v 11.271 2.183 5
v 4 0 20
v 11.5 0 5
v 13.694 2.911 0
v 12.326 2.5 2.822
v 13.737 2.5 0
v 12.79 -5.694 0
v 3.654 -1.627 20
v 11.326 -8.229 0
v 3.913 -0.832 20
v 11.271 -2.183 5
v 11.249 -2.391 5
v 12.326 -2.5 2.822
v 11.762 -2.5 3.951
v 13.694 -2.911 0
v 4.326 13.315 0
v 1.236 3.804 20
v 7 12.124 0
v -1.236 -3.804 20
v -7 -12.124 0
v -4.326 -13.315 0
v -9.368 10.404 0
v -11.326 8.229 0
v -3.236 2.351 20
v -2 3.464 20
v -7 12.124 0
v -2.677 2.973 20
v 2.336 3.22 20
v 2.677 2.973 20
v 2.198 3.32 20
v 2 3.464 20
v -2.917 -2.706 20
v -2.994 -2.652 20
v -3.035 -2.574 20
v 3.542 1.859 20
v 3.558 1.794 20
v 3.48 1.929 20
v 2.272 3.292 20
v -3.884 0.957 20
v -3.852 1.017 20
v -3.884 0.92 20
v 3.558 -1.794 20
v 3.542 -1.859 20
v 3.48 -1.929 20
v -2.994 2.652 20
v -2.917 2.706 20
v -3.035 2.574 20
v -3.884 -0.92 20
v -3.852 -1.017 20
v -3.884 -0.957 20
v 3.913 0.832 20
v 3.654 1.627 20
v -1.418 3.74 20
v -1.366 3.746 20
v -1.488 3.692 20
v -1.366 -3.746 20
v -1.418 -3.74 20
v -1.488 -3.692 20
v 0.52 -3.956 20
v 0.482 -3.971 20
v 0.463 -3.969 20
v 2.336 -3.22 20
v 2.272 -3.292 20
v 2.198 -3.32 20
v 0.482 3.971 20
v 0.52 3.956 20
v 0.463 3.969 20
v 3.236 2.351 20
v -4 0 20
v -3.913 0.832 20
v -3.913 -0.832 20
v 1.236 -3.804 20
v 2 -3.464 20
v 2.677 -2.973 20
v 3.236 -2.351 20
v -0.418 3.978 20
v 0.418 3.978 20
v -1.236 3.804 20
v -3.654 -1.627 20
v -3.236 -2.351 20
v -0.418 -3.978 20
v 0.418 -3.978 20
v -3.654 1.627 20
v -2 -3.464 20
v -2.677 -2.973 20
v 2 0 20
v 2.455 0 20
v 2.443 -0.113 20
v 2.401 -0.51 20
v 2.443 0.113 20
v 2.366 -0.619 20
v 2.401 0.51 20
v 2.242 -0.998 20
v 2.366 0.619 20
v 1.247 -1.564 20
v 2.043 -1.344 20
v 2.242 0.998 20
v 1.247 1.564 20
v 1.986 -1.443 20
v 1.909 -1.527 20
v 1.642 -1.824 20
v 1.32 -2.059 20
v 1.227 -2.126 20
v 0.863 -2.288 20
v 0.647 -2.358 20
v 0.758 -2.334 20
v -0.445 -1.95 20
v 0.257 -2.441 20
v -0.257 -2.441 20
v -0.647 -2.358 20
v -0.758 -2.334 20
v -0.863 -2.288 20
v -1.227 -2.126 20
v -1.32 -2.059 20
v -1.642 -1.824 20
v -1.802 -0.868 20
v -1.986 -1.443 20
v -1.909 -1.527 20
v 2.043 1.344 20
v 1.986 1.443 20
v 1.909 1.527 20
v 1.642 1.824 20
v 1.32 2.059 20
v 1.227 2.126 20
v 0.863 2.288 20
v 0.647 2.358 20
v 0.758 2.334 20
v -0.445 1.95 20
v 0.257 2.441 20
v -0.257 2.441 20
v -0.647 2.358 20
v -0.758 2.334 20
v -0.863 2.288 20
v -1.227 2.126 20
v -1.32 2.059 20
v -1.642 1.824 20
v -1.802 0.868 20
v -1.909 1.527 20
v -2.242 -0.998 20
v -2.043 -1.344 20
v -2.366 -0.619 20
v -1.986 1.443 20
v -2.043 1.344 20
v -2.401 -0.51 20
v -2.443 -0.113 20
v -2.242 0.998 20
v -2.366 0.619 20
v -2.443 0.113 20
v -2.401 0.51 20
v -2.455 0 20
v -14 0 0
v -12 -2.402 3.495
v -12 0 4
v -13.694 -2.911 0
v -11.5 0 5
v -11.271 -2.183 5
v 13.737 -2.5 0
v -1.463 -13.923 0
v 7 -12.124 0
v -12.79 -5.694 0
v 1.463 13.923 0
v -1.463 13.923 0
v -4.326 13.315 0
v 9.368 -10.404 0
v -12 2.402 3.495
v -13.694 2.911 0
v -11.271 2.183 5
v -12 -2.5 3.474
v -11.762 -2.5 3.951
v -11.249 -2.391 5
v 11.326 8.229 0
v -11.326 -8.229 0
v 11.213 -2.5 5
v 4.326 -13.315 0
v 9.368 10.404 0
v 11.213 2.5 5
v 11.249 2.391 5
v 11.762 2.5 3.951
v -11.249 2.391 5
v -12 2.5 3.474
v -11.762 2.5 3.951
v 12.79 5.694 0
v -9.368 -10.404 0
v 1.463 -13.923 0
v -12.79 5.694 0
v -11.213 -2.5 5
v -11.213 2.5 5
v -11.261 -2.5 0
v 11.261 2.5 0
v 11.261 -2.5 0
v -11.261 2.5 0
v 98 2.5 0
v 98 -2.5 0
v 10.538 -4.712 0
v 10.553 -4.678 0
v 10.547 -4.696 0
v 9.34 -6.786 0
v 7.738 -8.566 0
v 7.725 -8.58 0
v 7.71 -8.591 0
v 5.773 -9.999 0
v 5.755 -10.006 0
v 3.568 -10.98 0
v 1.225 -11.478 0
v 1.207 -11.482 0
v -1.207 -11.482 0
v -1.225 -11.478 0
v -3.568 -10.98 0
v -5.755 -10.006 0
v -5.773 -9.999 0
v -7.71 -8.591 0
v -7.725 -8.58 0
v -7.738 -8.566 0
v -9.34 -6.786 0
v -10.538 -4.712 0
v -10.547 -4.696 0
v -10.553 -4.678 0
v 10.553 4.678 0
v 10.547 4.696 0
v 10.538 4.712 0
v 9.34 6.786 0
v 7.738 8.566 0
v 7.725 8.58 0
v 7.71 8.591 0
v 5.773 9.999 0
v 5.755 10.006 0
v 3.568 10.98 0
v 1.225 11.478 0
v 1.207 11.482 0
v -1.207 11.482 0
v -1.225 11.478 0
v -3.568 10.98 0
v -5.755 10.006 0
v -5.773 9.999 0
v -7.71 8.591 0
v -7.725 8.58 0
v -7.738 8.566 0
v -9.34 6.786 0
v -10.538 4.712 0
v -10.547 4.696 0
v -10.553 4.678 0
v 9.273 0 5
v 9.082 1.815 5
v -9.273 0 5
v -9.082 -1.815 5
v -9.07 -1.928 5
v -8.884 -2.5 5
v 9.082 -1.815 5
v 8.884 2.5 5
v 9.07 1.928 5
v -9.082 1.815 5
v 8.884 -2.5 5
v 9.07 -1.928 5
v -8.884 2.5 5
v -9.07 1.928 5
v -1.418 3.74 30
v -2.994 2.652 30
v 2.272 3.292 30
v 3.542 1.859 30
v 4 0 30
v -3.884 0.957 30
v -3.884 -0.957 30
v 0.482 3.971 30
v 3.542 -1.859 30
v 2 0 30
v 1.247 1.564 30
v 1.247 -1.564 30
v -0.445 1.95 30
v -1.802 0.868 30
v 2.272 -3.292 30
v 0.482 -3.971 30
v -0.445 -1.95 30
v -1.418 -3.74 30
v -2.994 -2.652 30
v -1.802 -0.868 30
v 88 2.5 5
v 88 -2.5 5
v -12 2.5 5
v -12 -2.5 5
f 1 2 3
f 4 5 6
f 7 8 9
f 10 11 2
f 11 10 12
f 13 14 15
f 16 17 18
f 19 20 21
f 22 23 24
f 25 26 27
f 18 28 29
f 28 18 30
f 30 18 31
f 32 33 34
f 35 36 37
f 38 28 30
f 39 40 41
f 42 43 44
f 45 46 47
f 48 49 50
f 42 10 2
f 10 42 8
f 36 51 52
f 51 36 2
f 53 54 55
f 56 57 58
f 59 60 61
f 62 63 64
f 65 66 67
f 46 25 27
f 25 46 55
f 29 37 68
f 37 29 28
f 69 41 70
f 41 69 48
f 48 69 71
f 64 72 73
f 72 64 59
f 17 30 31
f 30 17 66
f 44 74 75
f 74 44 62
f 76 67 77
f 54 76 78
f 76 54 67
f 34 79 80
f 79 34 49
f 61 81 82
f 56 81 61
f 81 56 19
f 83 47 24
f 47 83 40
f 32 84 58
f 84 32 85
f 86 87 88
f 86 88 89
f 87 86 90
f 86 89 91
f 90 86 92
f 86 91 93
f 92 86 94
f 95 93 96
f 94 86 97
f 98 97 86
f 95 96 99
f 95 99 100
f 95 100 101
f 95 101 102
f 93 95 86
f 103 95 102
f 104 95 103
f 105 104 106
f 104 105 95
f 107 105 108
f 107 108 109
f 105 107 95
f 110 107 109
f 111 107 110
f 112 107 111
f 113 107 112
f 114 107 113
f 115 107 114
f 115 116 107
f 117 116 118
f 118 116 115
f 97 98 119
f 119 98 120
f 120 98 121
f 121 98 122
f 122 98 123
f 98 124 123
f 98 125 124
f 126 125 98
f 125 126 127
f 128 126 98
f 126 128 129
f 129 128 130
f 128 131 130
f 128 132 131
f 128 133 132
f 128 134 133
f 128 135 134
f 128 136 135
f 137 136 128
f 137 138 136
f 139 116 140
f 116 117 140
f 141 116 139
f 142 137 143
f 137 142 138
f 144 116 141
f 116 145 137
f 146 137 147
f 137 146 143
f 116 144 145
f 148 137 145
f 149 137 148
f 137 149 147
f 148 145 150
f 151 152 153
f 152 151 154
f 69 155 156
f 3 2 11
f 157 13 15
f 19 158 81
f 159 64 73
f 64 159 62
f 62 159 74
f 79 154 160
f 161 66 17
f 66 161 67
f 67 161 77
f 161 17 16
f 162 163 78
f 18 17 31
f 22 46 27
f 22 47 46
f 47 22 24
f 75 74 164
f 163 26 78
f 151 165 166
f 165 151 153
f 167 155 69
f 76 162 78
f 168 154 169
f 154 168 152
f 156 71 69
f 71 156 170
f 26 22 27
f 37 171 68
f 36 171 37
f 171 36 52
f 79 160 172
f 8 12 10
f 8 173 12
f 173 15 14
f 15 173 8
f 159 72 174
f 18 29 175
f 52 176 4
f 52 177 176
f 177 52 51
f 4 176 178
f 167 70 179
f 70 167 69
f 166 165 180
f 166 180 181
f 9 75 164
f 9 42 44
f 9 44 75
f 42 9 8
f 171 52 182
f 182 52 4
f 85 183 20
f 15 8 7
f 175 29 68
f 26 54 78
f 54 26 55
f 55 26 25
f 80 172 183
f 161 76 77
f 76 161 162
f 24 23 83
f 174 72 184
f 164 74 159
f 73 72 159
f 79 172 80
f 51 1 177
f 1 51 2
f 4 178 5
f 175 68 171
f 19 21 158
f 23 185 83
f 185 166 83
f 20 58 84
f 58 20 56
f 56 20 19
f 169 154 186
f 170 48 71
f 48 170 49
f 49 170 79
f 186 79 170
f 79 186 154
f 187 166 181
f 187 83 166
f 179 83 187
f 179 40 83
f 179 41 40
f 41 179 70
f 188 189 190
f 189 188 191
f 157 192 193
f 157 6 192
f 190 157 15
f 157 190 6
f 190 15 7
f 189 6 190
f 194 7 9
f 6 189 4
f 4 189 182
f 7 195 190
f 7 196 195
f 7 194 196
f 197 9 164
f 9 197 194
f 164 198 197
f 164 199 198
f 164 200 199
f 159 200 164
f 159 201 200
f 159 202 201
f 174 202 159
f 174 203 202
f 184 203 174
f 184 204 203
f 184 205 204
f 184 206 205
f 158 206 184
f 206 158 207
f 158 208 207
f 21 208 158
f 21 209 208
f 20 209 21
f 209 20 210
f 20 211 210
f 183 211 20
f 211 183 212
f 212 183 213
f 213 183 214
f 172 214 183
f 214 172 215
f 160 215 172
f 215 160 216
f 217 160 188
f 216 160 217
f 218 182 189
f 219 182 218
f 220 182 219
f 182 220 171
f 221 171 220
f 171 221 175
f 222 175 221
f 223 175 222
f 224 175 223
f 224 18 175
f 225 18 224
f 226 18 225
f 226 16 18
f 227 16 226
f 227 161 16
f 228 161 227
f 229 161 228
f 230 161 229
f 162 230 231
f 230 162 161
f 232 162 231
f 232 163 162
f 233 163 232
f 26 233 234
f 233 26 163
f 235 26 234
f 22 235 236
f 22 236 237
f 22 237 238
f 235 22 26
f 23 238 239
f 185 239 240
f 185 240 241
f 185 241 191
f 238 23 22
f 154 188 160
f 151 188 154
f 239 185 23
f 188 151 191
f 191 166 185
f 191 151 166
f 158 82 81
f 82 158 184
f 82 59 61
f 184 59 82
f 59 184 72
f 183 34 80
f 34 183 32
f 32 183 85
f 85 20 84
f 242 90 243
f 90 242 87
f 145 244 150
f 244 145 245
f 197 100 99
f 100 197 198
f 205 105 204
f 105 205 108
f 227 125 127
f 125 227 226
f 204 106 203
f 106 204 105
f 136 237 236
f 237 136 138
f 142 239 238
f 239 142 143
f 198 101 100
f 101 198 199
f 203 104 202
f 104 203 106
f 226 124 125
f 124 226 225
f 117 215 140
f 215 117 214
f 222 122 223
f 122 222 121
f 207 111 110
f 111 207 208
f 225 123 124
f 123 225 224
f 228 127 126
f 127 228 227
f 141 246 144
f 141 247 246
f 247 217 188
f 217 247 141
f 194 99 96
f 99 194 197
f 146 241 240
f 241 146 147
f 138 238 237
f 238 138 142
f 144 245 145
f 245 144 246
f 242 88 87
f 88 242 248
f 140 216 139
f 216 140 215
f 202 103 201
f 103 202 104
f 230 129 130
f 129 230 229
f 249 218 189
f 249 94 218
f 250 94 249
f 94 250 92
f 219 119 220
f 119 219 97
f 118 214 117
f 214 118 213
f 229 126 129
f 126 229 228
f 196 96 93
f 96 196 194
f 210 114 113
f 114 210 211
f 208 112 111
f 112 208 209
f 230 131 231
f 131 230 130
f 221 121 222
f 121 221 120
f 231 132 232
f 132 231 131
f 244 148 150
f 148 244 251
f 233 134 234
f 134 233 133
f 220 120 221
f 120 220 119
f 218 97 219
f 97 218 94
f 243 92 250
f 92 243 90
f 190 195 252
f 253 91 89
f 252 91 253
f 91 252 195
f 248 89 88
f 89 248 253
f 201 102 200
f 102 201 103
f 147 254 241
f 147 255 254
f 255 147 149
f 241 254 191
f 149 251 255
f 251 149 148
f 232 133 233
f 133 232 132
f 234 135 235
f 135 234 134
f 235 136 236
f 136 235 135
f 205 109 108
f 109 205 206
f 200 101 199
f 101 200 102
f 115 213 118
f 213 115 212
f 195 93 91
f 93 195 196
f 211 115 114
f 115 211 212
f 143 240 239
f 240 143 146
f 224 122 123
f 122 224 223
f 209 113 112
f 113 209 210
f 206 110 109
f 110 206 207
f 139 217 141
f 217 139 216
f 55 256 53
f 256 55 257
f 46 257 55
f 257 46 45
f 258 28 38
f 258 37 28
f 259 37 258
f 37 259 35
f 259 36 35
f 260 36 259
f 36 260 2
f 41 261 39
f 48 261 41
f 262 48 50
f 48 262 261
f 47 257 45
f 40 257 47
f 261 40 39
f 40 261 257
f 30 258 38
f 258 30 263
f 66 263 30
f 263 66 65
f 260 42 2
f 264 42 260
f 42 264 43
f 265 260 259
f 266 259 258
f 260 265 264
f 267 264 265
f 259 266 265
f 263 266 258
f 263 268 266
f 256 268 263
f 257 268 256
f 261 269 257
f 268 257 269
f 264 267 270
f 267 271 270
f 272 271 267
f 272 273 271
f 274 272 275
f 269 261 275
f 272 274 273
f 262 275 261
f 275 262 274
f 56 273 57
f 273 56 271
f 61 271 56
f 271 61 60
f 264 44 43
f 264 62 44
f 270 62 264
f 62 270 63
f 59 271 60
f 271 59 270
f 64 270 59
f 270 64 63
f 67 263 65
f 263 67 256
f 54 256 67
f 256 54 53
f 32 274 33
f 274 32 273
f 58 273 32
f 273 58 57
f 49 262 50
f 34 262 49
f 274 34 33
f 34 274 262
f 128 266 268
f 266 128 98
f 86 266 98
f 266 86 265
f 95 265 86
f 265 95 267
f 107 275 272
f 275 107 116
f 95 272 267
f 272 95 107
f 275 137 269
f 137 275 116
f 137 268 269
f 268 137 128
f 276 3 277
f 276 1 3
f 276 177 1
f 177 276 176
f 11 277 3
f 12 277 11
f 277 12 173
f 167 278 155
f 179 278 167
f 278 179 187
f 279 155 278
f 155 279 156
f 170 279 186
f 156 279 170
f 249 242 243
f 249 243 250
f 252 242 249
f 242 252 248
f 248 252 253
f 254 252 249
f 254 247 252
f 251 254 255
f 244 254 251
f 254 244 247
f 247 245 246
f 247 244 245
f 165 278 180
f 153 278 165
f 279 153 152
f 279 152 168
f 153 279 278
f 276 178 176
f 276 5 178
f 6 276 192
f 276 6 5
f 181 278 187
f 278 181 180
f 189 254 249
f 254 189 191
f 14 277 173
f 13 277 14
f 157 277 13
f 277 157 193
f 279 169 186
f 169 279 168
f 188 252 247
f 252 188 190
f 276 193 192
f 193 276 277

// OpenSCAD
TubeRI = 4;
Length=100;
    
    


translate([0,0,10])
difference(){
cylinder(h = 20, r1 = TubeRI*3+2, r2 = TubeRI, center = true );
cylinder(h = 22, r1 = TubeRI*3, r2 = TubeRI-2, center = true );
};
translate([0,0,25])
difference(){
cylinder(h=10,r=TubeRI,center=true);
cylinder(h=12,r=TubeRI-2,center=true);
}
translate([-TubeRI*3,-2.5,0])
cube([Length,5,5]);
translate([Length-TubeRI*3,-2.5,0])
prism(5, 10, 5);


//Draw a prism based on a 
//right angled triangle
//l - length of prism
//w - width of triangle
//h - height of triangle
module prism(l, w, h) {
       polyhedron(points=[
               [0,0,h],           // 0    front top corner
               [0,0,0],[w,0,0],   // 1, 2 front left & right bottom corners
               [0,l,h],           // 3    back top corner
               [0,l,0],[w,l,0]    // 4, 5 back left & right bottom corners
       ], faces=[ // points for all faces must be ordered clockwise when looking in
               [0,2,1],    // top face
               [3,4,5],    // base face
               [0,1,4,3],  // h face
               [1,2,5,4],  // w face
               [0,3,5,2],  // hypotenuse face
       ]);
}
